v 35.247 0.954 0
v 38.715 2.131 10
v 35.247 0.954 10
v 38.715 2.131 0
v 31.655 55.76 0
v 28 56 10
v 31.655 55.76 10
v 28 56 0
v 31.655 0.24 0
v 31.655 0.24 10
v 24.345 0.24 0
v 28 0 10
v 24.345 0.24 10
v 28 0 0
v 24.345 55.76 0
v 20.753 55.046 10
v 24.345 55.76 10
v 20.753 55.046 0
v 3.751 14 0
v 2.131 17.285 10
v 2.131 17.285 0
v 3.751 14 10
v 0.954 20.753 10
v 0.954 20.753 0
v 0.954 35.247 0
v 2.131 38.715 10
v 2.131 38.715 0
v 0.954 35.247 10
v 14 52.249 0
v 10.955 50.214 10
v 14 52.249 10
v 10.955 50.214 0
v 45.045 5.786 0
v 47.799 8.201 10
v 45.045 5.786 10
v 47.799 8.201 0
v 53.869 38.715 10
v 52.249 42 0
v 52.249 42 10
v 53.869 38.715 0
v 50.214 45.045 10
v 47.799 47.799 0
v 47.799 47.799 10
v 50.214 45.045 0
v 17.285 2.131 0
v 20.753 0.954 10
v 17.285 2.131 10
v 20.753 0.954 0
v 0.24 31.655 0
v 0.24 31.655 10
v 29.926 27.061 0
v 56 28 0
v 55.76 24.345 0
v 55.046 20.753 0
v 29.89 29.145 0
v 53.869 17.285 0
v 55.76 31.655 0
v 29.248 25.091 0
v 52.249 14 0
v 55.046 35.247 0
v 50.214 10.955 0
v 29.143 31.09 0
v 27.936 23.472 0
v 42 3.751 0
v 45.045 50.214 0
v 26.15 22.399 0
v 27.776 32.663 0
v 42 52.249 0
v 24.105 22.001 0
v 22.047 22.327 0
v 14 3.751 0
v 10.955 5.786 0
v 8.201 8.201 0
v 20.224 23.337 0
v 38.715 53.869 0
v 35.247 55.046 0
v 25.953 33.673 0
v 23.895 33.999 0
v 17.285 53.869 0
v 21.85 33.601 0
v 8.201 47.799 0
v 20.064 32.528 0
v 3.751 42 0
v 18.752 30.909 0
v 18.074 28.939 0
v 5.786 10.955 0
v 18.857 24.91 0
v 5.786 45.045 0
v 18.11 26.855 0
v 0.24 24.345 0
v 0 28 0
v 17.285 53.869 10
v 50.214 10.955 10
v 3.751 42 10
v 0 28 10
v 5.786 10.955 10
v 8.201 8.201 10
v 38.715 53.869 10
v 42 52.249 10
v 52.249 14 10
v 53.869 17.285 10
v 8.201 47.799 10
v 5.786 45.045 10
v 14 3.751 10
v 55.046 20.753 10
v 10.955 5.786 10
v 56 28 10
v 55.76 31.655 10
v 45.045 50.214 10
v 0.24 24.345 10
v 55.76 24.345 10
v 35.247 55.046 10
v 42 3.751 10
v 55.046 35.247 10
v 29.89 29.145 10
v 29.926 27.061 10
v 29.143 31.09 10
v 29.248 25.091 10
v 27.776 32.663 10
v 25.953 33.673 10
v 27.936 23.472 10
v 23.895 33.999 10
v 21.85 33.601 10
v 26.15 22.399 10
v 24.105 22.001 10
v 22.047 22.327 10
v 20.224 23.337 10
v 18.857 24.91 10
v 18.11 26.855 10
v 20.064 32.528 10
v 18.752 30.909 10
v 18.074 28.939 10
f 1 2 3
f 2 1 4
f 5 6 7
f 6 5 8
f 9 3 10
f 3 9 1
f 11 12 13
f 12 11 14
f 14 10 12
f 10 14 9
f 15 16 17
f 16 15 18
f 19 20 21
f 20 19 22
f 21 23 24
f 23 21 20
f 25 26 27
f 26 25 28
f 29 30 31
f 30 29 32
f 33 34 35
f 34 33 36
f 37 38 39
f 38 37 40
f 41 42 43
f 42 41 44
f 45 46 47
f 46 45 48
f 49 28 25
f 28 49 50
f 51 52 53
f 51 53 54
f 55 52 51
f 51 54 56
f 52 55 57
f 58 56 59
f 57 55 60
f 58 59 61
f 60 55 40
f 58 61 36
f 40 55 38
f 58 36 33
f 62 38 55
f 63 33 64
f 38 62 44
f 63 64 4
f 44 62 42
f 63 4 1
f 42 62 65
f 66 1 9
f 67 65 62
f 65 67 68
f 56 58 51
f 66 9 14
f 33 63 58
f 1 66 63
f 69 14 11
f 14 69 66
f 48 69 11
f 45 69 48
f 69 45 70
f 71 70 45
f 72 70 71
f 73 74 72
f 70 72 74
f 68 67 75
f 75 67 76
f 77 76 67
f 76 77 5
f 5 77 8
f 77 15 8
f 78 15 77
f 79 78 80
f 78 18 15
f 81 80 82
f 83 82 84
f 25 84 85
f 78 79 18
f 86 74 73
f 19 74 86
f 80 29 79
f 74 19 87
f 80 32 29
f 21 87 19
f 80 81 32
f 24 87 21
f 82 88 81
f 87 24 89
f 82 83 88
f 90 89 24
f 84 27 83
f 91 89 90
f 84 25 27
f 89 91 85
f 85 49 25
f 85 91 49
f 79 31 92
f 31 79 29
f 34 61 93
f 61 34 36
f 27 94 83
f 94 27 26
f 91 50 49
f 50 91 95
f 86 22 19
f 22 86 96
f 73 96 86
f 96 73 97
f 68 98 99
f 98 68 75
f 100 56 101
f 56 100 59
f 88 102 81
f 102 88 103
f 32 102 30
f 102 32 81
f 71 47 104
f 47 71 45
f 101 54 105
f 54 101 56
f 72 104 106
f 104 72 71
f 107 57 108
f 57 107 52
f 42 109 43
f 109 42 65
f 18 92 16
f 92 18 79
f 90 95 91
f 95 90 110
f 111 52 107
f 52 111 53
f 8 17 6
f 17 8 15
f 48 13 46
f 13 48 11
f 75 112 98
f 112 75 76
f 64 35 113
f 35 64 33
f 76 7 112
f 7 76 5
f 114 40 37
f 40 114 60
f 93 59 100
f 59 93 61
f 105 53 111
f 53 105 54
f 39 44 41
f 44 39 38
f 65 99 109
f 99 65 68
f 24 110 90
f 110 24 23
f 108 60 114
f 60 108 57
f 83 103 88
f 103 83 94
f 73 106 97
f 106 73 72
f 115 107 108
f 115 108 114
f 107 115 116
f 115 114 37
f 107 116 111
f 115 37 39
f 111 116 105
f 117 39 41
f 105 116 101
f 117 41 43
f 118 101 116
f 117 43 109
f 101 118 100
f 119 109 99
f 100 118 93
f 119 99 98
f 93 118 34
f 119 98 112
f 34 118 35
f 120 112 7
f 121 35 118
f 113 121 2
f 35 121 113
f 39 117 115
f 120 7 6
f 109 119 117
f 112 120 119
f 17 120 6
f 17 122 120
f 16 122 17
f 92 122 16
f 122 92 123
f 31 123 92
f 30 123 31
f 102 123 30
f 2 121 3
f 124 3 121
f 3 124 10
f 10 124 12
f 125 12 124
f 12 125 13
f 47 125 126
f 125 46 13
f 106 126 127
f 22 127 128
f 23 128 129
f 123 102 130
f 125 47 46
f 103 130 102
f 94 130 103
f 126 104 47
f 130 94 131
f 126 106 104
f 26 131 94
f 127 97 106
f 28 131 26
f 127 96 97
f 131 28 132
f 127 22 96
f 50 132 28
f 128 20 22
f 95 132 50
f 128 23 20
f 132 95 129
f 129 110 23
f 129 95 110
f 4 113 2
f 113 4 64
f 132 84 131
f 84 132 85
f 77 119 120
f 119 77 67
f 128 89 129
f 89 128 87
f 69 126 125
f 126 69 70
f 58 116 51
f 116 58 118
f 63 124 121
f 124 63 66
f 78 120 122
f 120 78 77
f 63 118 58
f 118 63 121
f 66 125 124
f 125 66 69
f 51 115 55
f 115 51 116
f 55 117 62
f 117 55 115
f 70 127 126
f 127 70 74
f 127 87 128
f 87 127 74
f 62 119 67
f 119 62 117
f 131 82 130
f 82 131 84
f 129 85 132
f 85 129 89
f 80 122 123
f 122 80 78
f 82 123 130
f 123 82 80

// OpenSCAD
$fn = 32;

// ----------------------------------------------------------------------
// Cam plate: eccentric cam, base R28
// ----------------------------------------------------------------------

// --- parameters (mm) ---
base_r = 28;              // base circle radius
lobe_h = 12;              // cam lobe rise
bore_r = 6;               // shaft bore radius
plate_t = 10;             // plate thickness, Z (extrusion height)
ecc = 4;                  // disc eccentricity

profile = [[56, 28], [55.76, 31.655], [55.046, 35.247], [53.869, 38.715], [52.249, 42], [50.214, 45.045], [47.799, 47.799], [45.045, 50.214], [42, 52.249], [38.715, 53.869], [35.247, 55.046], [31.655, 55.76], [28, 56], [24.345, 55.76], [20.753, 55.046], [17.285, 53.869], [14, 52.249], [10.955, 50.214], [8.201, 47.799], [5.786, 45.045], [3.751, 42], [2.131, 38.715], [0.954, 35.247], [0.24, 31.655], [0, 28], [0.24, 24.345], [0.954, 20.753], [2.131, 17.285], [3.751, 14], [5.786, 10.955], [8.201, 8.201], [10.955, 5.786], [14, 3.751], [17.285, 2.131], [20.753, 0.954], [24.345, 0.24], [28, 0], [31.655, 0.24], [35.247, 0.954], [38.715, 2.131], [42, 3.751], [45.045, 5.786], [47.799, 8.201], [50.214, 10.955], [52.249, 14], [53.869, 17.285], [55.046, 20.753], [55.76, 24.345]];  // primary outline, 48 points, counter clockwise
void_1 = [[29.89, 29.145], [29.143, 31.09], [27.776, 32.663], [25.953, 33.673], [23.895, 33.999], [21.85, 33.601], [20.064, 32.528], [18.752, 30.909], [18.074, 28.939], [18.11, 26.855], [18.857, 24.91], [20.224, 23.337], [22.047, 22.327], [24.105, 22.001], [26.15, 22.399], [27.936, 23.472], [29.248, 25.091], [29.926, 27.061]];  // shaft bore, 18 points

// --- the one profile operation ---
difference() {
  linear_extrude(height = plate_t) polygon(points = profile);
  translate([0, 0, -1])
    linear_extrude(height = plate_t + 2) polygon(points = void_1);
}
